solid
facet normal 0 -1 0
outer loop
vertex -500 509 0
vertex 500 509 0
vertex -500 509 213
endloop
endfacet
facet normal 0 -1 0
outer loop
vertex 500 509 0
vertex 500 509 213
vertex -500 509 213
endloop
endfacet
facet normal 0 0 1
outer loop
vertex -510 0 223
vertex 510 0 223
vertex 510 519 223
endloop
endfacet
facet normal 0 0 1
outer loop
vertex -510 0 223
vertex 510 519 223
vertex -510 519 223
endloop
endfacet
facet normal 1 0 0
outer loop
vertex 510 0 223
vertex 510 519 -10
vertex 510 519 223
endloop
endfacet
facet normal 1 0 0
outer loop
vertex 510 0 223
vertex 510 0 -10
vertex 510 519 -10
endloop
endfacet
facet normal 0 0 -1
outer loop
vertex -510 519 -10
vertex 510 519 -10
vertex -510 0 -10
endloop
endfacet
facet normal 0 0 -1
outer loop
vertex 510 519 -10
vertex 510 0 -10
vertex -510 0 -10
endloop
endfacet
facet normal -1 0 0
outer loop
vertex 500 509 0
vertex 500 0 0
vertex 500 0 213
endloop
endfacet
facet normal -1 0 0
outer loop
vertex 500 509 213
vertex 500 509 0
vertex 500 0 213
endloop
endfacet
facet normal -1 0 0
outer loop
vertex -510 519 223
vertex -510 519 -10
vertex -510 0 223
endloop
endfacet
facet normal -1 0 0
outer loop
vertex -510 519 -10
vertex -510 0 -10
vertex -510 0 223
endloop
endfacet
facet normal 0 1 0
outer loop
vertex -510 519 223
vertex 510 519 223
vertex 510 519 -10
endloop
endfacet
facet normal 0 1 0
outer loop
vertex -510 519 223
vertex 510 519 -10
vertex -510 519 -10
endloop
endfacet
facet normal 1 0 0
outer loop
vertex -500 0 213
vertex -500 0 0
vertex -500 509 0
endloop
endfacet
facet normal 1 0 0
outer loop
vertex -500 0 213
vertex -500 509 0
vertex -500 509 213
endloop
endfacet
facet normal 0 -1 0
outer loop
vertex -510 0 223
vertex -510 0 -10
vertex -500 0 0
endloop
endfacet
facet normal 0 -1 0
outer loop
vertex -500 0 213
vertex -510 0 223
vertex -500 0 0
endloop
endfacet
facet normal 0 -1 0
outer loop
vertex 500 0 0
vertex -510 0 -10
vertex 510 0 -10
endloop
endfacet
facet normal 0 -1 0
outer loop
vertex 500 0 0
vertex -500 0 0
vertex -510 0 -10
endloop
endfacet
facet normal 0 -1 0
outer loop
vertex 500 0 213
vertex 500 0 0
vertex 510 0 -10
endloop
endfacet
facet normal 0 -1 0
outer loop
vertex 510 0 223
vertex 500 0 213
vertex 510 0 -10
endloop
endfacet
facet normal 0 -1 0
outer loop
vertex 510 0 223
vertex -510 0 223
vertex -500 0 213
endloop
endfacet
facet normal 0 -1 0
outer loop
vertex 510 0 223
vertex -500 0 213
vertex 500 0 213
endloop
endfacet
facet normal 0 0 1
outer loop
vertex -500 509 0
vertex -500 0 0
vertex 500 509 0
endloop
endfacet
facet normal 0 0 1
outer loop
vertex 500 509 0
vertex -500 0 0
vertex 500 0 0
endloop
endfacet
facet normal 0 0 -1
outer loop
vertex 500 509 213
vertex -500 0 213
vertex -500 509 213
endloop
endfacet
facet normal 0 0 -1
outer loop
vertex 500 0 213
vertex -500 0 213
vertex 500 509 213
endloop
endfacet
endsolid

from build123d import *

# Parameters (mm, degrees)
F0_W     = 1020
F0_H     = 233
F0_W_2   = 1000
F0_H_2   = 213
F1_DEPTH = 509
F2_W     = 1020
F2_H     = 233
F2_W_2   = 1000
F2_H_2   = 213
F3_DEPTH = 10


with BuildPart() as f1:
    # F0 (on Front) → F1 (new body)
    with BuildSketch(Plane.XZ):
        with Locations((0, 106.5)):
            Rectangle(F0_W, F0_H)
        with Locations((0, 106.5)):
            Rectangle(F0_W_2, F0_H_2, mode=Mode.SUBTRACT)
    extrude(amount=-F1_DEPTH)

    # F2 (on face) → F3 (join)
    with BuildSketch(Plane(origin=(0, 509, 0), x_dir=(-1, 0, 0), z_dir=(0, 1, 0))):
        with Locations((0, 106.5)):
            Rectangle(F2_W, F2_H)
        with Locations((0, 106.5)):
            Rectangle(F2_W_2, F2_H_2, mode=Mode.SUBTRACT)
        with Locations((0, 106.5)):
            Rectangle(F2_W_2, F2_H_2)
    extrude(amount=F3_DEPTH)


solid = f1.part
